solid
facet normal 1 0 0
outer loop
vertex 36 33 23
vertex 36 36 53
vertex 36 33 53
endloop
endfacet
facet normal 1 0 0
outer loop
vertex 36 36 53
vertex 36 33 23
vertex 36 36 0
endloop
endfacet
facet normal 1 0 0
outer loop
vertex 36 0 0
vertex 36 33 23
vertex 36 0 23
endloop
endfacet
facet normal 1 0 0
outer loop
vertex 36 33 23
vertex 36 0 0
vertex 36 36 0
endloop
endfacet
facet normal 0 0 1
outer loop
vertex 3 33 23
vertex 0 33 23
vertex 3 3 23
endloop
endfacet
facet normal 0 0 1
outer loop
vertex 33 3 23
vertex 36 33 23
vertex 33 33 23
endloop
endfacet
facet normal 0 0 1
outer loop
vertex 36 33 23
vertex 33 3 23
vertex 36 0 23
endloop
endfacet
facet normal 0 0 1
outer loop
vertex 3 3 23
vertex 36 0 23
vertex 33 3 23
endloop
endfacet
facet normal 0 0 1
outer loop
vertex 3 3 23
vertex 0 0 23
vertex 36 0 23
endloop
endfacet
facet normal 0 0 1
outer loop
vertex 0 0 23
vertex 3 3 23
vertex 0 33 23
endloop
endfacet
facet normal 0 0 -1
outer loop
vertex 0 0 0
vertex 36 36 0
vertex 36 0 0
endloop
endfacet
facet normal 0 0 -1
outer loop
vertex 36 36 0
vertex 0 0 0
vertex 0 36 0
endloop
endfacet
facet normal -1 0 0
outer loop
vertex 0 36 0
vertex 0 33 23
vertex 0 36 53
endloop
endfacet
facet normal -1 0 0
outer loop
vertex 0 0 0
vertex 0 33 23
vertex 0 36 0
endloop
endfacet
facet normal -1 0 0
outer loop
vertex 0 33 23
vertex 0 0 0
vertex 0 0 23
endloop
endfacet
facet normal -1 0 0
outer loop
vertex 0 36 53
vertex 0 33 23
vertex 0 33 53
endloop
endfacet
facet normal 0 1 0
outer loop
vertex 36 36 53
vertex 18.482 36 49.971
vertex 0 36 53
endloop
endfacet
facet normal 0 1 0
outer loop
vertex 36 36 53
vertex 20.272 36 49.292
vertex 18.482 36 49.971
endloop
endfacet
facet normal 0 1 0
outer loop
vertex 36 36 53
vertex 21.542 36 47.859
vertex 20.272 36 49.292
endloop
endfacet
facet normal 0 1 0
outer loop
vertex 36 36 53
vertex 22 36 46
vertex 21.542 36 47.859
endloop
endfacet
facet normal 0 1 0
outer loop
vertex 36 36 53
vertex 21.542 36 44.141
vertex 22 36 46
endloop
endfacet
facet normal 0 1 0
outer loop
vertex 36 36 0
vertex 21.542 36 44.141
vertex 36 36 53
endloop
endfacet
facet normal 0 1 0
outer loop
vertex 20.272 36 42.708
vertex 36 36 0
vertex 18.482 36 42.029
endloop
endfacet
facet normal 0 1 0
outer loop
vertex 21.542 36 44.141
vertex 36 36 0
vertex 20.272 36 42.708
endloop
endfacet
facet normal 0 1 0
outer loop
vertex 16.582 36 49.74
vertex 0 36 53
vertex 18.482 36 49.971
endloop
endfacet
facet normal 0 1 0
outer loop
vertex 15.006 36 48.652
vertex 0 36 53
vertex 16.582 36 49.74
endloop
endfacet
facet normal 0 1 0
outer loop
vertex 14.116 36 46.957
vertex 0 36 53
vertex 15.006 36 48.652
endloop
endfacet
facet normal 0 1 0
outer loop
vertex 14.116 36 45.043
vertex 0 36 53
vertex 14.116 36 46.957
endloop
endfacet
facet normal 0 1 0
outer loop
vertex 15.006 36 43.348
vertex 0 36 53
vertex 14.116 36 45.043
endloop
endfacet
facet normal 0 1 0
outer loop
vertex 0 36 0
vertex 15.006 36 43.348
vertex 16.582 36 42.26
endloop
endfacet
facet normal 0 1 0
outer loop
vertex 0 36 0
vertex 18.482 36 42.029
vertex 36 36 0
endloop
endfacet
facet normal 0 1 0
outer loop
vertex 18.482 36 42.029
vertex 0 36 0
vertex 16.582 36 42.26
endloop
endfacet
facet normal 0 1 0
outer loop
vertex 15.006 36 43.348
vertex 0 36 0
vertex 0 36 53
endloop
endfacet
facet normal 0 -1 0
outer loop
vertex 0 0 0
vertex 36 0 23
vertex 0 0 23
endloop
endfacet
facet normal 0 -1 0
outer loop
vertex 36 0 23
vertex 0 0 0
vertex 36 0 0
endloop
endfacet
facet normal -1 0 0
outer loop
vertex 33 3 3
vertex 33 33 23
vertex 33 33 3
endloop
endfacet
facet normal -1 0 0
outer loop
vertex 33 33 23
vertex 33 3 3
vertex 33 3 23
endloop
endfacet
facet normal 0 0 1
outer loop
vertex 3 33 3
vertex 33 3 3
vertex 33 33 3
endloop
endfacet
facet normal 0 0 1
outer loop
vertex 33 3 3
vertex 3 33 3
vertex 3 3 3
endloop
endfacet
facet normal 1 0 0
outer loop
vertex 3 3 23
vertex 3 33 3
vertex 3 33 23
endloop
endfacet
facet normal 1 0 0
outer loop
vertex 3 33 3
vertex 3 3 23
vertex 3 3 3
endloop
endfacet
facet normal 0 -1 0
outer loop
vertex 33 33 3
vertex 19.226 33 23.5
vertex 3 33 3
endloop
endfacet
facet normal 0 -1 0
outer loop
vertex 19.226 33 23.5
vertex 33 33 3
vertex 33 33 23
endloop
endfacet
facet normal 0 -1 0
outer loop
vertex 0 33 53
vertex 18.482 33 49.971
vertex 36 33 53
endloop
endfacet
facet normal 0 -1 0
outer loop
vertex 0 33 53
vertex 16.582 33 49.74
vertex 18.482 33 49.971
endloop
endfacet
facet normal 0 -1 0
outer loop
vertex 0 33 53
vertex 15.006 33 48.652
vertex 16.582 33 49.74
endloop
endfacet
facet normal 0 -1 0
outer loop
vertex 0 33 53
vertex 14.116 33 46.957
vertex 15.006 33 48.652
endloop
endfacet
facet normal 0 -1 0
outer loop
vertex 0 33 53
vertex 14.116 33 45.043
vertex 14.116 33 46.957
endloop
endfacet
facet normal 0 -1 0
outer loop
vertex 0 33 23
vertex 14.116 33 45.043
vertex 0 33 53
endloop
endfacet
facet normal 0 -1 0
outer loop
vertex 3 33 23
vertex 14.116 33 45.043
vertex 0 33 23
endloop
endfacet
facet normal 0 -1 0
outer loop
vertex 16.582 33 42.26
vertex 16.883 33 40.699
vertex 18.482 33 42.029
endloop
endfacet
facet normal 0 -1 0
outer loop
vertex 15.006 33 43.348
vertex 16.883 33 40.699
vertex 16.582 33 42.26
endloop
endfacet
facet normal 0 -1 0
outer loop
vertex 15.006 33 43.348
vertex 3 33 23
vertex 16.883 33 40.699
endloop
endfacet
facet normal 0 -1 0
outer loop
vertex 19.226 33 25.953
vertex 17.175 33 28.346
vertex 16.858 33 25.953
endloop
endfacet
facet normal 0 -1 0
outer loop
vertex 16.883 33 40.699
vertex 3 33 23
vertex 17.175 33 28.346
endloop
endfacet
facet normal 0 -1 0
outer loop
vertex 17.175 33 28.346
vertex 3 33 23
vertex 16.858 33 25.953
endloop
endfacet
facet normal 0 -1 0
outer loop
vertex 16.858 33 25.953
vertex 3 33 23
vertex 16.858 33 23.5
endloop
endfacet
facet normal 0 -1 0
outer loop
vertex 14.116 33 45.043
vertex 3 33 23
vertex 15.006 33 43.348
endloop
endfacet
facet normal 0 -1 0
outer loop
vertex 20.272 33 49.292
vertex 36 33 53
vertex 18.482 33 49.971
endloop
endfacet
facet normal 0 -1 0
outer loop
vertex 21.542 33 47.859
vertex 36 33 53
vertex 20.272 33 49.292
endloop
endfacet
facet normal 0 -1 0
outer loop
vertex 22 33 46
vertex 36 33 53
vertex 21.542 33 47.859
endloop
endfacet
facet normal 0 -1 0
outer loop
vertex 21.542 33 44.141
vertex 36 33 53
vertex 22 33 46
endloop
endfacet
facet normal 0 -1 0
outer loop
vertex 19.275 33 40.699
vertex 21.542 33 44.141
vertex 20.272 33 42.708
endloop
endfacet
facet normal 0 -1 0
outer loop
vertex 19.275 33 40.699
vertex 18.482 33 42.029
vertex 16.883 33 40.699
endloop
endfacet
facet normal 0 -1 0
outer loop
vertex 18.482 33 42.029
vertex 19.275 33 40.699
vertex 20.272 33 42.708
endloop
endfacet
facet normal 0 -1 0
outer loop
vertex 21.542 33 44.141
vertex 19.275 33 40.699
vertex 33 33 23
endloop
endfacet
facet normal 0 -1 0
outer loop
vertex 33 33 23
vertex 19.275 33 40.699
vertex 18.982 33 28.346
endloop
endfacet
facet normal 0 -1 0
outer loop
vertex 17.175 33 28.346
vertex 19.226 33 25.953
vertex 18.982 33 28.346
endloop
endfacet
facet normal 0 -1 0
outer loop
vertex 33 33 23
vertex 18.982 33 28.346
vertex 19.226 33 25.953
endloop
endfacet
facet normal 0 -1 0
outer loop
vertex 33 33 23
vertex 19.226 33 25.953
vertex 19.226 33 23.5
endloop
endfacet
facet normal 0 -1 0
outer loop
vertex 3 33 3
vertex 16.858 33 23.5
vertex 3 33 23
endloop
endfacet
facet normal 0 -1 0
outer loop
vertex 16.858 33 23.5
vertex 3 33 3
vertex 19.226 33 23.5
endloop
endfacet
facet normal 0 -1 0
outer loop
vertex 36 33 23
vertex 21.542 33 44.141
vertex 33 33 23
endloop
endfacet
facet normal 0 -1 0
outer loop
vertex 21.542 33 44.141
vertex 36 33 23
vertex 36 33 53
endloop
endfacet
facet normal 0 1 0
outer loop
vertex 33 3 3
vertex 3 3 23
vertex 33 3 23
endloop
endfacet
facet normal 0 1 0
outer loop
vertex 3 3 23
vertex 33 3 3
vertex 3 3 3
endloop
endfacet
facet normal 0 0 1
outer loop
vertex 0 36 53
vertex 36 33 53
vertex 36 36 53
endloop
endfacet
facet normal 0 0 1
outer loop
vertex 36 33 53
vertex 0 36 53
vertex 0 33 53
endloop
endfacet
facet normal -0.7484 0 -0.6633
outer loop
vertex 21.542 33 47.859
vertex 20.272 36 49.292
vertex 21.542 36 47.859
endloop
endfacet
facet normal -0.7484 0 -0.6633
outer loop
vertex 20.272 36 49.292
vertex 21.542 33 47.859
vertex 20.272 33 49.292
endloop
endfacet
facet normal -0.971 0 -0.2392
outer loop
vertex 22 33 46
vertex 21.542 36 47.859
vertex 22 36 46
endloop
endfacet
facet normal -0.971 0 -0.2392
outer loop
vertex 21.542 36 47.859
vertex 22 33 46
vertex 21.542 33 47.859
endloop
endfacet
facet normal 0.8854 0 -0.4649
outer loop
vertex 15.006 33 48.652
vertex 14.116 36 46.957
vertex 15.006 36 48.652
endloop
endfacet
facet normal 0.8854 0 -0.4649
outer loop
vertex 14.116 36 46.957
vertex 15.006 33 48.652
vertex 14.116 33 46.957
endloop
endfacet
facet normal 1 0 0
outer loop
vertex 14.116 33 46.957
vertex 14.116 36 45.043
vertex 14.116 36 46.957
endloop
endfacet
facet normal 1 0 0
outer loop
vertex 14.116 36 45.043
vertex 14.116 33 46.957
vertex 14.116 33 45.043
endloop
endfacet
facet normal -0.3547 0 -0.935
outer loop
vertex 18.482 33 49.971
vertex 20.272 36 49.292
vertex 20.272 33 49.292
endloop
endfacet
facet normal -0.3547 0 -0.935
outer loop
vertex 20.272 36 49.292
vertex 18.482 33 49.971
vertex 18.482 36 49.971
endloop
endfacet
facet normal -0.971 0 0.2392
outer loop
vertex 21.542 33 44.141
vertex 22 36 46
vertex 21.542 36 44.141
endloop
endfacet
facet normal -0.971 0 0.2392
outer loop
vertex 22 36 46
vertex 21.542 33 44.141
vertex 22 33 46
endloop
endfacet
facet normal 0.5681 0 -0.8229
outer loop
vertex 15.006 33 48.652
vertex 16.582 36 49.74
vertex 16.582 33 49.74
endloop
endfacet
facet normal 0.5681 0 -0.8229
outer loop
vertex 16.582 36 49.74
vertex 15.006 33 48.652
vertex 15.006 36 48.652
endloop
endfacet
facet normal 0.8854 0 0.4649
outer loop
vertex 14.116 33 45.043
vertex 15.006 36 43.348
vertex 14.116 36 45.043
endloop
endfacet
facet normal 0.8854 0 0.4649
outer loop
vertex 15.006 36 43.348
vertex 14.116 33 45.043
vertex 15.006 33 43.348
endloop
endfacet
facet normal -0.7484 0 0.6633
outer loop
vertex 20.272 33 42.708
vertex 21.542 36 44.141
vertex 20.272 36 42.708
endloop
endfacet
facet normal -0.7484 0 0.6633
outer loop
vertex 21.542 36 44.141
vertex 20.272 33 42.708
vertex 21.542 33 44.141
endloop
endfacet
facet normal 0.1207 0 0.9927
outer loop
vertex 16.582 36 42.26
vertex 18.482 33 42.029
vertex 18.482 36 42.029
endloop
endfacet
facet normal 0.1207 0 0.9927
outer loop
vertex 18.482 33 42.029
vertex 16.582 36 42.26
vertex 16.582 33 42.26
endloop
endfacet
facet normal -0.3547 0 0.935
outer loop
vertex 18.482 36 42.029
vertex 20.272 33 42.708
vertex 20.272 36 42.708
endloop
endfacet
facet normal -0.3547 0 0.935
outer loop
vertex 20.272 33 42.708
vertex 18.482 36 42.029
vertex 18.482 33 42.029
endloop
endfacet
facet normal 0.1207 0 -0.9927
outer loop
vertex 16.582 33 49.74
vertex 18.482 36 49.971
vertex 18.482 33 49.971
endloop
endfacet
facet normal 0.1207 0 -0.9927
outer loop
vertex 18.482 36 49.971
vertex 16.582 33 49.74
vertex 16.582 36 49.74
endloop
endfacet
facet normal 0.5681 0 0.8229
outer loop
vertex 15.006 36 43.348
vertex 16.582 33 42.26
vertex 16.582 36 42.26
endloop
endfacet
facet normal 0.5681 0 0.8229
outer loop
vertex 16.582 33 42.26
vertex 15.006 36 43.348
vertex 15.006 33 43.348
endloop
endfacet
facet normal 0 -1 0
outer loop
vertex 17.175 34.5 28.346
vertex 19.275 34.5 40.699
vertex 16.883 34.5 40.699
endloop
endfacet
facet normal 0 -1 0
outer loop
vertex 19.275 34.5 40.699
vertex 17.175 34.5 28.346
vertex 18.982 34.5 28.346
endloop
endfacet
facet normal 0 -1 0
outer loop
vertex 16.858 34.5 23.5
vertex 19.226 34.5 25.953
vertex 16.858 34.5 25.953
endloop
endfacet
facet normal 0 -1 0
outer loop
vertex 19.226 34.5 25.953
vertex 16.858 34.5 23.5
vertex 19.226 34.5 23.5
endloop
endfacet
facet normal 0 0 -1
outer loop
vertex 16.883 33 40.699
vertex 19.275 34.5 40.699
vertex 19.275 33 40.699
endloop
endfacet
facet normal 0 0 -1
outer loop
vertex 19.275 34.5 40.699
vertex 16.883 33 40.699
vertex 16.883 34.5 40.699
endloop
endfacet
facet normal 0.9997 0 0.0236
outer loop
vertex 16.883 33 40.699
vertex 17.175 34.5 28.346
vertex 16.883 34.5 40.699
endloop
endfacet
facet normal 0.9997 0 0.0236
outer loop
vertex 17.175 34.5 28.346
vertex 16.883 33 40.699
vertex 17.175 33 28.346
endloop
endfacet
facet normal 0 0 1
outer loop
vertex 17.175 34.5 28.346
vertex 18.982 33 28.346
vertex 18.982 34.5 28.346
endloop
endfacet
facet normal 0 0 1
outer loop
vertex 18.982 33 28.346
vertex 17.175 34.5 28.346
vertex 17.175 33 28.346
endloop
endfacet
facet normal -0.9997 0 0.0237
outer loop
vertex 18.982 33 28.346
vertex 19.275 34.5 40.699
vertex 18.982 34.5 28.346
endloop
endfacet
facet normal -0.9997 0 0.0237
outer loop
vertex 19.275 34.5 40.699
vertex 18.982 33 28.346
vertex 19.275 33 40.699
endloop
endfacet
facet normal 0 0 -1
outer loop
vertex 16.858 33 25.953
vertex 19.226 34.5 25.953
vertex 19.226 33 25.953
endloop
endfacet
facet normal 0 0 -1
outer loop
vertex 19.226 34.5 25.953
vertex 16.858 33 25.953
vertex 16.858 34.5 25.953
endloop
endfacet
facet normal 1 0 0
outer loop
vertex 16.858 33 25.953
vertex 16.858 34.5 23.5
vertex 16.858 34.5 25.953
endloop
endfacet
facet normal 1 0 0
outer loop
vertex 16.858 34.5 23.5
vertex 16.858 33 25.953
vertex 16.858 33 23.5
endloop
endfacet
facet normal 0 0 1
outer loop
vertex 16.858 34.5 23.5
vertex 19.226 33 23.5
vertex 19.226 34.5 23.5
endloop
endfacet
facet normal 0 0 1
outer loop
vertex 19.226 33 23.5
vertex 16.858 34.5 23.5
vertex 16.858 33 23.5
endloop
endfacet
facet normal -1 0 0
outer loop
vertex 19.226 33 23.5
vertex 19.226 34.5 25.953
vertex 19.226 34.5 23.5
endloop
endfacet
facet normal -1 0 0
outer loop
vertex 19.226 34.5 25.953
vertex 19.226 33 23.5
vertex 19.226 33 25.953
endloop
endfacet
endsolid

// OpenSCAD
TRAY_WIDTH = 30;
TRAY_DEPTH = 30;
TRAY_HEIGHT = 20;

HANGER_HEIGHT = 30;

WALL_WIDTH = 3;

HOLE_DIAMETER = 8;
hole_radius = HOLE_DIAMETER / 2;

font = "Liberation Sans";
emboss_height = 18;
emboss_depth = WALL_WIDTH / 2;

total_width = WALL_WIDTH * 2 + TRAY_WIDTH;
total_depth = WALL_WIDTH * 2 + TRAY_DEPTH;
total_height = WALL_WIDTH + TRAY_HEIGHT;

module hanger() {
    cube([total_width, WALL_WIDTH, HANGER_HEIGHT + total_height]);
}

module exclaim() {
    offset_x = total_width / 2 - 3.4;
    offset_y = emboss_depth;
    offset_z = total_height + (HANGER_HEIGHT - WALL_WIDTH - HOLE_DIAMETER - emboss_height) / 2;

    translate([offset_x, offset_y, offset_z])
    rotate([90, 0, 0])
    linear_extrude(height = emboss_depth) {
        text(
            "!",
            size = emboss_height,
            font = font,
            halign = "left",
            valign = "baseline",
            spacing = 1.5,
            $fn = 16
        );
    }
}

module mounting_hole() {
    offset_x = total_width / 2;
    offset_y = WALL_WIDTH;
    offset_z = total_height + HANGER_HEIGHT - WALL_WIDTH - hole_radius;

    translate([offset_x, offset_y, offset_z])
    rotate([90, 0, 0])
    cylinder(h = WALL_WIDTH, d = HOLE_DIAMETER);
}

module back_wall() {
    translate([0, total_depth - WALL_WIDTH, 0])
    difference() {
        hanger();
        mounting_hole();
        exclaim();
    }
}

union() {
    difference() {
        cube([total_width, total_depth, total_height]);
        translate([WALL_WIDTH, WALL_WIDTH, WALL_WIDTH])
        cube([TRAY_WIDTH, TRAY_DEPTH, TRAY_HEIGHT]);
    }
    back_wall();
}
